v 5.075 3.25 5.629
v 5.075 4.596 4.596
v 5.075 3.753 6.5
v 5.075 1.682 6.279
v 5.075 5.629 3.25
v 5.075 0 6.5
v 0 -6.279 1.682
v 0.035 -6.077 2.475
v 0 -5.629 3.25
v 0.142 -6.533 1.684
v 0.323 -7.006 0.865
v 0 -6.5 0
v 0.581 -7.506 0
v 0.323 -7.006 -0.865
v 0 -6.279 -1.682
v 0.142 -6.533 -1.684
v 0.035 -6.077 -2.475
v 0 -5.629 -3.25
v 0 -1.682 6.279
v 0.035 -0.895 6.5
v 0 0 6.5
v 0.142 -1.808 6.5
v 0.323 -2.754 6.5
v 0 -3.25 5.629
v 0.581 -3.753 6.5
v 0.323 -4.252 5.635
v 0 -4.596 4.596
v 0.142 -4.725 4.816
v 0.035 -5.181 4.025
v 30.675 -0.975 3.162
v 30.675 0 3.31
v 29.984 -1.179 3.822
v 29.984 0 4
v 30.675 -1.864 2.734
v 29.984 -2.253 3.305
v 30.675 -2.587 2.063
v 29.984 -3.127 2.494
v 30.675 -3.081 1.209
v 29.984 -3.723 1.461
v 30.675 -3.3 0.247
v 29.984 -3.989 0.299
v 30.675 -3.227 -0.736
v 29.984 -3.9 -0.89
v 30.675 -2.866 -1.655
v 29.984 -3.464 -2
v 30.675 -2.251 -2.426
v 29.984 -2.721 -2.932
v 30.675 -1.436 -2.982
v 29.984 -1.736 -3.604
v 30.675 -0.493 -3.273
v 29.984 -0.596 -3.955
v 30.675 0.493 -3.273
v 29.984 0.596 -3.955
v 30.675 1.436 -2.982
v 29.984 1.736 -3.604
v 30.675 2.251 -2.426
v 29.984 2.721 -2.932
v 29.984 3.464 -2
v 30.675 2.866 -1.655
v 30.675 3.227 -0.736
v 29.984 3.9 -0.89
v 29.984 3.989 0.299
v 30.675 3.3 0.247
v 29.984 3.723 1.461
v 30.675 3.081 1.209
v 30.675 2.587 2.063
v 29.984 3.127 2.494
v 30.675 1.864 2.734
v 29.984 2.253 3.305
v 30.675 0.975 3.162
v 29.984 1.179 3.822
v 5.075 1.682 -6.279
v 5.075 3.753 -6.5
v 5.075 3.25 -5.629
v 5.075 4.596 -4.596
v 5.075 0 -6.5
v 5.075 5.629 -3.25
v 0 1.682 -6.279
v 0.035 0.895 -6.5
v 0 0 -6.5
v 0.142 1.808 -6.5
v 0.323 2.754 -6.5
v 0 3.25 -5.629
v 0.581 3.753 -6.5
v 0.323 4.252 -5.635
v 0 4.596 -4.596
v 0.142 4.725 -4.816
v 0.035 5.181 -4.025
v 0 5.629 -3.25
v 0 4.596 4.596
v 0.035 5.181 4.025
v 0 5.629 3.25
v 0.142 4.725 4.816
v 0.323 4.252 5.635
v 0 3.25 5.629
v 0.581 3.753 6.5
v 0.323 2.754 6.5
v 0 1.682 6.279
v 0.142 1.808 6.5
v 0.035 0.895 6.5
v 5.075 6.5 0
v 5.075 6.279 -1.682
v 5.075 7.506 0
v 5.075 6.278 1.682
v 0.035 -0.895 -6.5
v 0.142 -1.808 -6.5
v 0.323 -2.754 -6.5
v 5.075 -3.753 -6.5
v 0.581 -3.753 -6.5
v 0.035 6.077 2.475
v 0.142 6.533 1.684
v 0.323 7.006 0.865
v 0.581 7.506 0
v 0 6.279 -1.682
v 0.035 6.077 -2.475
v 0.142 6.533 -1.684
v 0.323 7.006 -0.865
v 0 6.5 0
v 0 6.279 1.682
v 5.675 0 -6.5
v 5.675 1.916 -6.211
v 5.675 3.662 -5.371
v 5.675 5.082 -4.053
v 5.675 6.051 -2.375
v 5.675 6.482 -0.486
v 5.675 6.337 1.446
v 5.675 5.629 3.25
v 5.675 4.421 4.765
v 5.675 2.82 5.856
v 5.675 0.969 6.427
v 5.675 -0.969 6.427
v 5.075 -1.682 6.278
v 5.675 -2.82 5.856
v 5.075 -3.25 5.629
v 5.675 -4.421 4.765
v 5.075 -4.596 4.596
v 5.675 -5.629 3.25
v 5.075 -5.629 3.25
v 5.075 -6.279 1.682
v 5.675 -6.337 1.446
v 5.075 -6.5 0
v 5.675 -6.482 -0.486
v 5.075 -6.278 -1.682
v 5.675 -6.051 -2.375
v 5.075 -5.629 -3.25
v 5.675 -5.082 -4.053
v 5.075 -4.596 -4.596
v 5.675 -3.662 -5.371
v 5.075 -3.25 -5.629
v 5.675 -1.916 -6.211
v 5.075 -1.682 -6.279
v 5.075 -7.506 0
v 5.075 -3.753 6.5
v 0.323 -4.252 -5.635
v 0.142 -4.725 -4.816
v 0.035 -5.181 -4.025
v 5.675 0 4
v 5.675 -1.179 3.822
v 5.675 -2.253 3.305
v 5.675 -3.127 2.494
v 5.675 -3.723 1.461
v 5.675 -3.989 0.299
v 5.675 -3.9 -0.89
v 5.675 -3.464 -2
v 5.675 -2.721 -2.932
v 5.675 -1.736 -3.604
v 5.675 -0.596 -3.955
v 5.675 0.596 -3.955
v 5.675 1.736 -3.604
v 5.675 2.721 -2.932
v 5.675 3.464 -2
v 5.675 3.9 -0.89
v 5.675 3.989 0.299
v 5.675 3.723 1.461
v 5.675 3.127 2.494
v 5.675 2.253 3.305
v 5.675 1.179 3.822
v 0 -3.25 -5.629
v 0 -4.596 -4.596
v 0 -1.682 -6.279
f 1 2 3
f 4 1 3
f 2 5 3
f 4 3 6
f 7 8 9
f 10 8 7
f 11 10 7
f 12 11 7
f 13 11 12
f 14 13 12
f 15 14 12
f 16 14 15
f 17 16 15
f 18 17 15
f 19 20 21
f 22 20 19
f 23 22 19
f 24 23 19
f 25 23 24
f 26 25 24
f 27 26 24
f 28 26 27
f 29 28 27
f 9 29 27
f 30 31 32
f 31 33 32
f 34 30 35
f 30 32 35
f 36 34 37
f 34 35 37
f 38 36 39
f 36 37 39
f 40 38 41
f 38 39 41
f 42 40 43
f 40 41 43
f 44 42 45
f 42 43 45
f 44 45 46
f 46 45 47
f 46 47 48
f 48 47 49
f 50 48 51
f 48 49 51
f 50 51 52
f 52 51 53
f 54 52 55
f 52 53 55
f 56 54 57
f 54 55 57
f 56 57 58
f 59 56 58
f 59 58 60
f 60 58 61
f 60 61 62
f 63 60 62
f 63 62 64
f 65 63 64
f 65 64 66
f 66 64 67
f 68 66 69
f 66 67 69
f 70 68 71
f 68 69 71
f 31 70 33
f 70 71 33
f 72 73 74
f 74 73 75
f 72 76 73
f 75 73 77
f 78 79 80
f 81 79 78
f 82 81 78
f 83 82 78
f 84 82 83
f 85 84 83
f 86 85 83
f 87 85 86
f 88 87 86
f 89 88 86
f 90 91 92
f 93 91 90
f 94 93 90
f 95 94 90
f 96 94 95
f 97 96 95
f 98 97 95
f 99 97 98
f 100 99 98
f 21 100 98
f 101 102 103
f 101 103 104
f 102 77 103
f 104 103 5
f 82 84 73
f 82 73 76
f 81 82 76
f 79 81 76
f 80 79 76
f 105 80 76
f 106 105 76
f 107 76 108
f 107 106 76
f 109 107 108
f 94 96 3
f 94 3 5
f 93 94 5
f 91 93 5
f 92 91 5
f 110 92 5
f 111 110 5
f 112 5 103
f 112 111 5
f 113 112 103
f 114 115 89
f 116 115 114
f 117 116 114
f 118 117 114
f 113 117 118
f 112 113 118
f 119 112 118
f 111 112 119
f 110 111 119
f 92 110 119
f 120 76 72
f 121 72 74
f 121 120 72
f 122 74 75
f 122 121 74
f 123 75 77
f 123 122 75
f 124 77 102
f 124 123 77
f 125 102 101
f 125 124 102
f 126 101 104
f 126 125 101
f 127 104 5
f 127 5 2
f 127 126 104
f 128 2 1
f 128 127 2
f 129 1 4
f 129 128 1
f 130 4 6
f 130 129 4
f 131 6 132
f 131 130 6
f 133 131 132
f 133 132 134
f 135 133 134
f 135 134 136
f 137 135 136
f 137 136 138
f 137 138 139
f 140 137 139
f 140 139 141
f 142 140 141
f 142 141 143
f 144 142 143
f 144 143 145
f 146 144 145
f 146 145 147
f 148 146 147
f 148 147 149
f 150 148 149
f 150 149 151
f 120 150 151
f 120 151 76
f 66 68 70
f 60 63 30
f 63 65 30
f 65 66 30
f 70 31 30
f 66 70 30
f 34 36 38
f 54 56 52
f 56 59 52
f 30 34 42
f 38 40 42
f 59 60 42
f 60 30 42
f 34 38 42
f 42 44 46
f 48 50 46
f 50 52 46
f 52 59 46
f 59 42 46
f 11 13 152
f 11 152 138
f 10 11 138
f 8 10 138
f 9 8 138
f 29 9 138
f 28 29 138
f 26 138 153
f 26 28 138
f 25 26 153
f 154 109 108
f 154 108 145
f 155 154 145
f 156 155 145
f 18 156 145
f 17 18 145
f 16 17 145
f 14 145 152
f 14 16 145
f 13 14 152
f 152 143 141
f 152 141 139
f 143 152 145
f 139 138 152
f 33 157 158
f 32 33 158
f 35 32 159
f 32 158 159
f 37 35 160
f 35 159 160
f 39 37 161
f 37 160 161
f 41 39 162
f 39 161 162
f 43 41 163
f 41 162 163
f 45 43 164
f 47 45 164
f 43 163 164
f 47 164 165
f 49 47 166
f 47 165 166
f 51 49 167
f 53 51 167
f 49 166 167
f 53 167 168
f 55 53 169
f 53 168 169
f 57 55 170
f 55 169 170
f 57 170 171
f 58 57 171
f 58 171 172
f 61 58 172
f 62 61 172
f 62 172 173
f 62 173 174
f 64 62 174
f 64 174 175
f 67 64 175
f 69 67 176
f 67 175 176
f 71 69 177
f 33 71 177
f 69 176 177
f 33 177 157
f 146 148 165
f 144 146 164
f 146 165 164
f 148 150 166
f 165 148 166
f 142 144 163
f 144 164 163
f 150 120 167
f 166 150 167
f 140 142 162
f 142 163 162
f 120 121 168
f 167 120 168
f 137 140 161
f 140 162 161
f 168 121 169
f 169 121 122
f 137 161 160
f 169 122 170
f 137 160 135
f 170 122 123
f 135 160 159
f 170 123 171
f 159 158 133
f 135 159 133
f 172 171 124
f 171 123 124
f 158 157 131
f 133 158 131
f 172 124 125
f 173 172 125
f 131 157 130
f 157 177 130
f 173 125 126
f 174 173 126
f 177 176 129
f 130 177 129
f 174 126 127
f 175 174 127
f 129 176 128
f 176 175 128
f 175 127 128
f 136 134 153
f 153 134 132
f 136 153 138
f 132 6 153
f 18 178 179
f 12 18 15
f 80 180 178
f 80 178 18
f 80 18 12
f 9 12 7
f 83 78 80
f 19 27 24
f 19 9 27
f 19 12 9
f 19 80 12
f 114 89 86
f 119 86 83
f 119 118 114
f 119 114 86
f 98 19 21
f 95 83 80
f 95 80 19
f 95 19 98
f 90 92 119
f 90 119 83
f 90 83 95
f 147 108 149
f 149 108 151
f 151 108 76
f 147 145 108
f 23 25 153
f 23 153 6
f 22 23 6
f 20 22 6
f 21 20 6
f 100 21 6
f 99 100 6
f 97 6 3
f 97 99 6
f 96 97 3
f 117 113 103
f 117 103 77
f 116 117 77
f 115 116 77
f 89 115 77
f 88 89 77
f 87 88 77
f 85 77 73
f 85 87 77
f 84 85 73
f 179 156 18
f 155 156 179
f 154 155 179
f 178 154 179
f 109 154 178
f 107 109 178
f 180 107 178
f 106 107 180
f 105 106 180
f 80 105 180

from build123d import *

# Parameters (mm, degrees)
BASEHEAD_DEPTH = 5.675
SKETCH4_W      = 0.6
SKETCH4_H      = 11.005553499


with BuildPart() as part:
    # Sketch1 → BaseHead (new body)
    with BuildSketch(Plane(origin=(0, 0, 0), x_dir=(0, 0, -1), z_dir=(1, 0, 0))):
        Polygon((6.5, 3.75277675), (6.5, -3.75277675), (0, -7.505553499), (-6.5, -3.75277675), (-6.5, 3.75277675), (0, 7.505553499), align=None)
    extrude(amount=BASEHEAD_DEPTH)

    # BodySke → BaseBody (revolve)
    with BuildSketch(Plane.XY, mode=Mode.PRIVATE) as basebody_sk:
        Polygon((0, 0), (30.675, 0), (30.675, 3.3095), (29.9845, 4), (0, 4), align=None)
    revolve(basebody_sk.sketch.rotate(Axis((0, 0, 0), (1, 0, 0)), 90), axis=Axis((0, 0, 0), (1, 0, 0)))

    # Sketch3 → HeadChamfer (revolve, cut)
    with BuildSketch(Plane.XY):
        Polygon((0, 6.5), (3.46730793, 12.505553499), (3.46730793, 17.505553499), (-10, 17.505553499), (-10, 6.5), align=None)
    revolve(axis=Axis((0, 0, 0), (1, 0, 0)), mode=Mode.SUBTRACT)

    # Sketch4 → BearingFace (revolve, cut)
    with BuildSketch(Plane.XY, mode=Mode.PRIVATE) as bearingface_sk:
        with Locations((5.375, 12.00277675)):
            Rectangle(SKETCH4_W, SKETCH4_H)
    revolve(bearingface_sk.sketch.rotate(Axis((0, 0, 0), (1, 0, 0)), 270), axis=Axis((0, 0, 0), (1, 0, 0)), mode=Mode.SUBTRACT)


solid = part.part
